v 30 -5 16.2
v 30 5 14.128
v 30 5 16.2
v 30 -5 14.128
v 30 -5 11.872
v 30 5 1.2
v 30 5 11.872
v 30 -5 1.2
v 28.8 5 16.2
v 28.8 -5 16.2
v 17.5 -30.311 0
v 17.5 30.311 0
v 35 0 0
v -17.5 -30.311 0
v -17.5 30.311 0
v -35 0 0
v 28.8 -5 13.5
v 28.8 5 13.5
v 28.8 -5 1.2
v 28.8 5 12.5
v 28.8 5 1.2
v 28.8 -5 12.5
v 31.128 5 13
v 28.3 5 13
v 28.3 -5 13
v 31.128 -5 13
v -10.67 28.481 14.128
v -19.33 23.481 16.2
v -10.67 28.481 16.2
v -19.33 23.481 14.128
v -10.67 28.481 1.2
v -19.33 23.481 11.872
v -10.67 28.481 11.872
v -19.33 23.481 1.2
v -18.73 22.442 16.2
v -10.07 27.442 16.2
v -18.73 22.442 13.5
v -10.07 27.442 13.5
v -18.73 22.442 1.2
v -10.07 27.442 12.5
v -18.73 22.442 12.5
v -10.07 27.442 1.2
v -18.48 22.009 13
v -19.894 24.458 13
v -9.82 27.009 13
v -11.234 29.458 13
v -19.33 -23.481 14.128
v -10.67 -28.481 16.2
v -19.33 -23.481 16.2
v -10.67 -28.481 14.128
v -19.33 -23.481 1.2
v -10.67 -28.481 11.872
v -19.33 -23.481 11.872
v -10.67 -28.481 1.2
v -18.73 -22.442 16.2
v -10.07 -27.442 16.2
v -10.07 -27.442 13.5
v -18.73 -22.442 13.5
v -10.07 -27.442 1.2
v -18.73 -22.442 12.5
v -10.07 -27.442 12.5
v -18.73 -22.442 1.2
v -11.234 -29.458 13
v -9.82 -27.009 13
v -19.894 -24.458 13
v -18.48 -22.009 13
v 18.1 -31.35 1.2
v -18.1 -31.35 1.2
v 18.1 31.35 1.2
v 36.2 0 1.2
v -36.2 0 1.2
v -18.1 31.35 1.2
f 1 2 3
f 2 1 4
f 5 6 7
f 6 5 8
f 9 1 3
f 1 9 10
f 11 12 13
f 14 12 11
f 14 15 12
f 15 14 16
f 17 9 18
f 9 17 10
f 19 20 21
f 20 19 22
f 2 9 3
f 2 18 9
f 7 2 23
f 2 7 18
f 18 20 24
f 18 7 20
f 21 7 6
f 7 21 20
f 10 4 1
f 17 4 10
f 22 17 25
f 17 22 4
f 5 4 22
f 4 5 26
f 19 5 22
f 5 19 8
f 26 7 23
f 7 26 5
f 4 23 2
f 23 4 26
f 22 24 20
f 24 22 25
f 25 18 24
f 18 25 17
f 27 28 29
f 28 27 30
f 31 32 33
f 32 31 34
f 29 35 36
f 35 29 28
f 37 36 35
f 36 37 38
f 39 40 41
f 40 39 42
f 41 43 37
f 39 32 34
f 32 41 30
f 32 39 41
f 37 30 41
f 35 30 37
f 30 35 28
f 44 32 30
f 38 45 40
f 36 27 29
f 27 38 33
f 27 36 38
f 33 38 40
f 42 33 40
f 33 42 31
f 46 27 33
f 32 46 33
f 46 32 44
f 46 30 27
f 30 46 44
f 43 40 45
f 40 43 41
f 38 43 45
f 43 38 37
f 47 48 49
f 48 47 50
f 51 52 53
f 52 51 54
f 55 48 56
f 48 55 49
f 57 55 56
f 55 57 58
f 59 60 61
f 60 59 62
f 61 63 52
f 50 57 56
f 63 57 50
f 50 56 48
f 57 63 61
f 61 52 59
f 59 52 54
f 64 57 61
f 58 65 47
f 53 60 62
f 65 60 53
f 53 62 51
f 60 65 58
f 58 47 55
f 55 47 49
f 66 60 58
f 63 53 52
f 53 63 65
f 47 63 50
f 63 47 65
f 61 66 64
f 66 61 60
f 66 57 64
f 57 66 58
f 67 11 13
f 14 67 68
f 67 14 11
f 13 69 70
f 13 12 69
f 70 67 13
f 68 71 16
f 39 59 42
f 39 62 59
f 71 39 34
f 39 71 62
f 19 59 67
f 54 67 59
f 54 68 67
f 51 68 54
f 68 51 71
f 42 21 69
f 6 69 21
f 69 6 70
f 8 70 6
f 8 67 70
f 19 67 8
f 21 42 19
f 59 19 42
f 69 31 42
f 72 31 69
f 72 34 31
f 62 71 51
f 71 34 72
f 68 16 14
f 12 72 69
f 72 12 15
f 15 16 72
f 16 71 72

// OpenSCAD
// Lusterdosendeckel
DeckelDicke = 5*0.24;
DeckelDurchmesser = 70;
LochDurchmesser = 60; 
ZapferlDicke = 1.2;
ZapferlBreite = 10;
ZapferlHoehe = 15;

$fn = 6;
{
    cylinder(d1 = DeckelDurchmesser, d2 = DeckelDurchmesser+2*DeckelDicke, h = DeckelDicke);  //45° Chamfer
    zapferl(0);
    zapferl(120);
    zapferl(240);
}

module zapferl(rot = 0)
{
    rotate([0,0,rot]) 
        translate([LochDurchmesser/2-ZapferlDicke/2,0,0])
            translate([-ZapferlDicke/2,-ZapferlBreite/2,0]) 
                {
                    cube([ZapferlDicke,ZapferlBreite,ZapferlHoehe+DeckelDicke]);
                     translate([-0.5,0,ZapferlHoehe-2]) rotate([0,45,0]) cube([2,ZapferlBreite,2]);
                }
}
